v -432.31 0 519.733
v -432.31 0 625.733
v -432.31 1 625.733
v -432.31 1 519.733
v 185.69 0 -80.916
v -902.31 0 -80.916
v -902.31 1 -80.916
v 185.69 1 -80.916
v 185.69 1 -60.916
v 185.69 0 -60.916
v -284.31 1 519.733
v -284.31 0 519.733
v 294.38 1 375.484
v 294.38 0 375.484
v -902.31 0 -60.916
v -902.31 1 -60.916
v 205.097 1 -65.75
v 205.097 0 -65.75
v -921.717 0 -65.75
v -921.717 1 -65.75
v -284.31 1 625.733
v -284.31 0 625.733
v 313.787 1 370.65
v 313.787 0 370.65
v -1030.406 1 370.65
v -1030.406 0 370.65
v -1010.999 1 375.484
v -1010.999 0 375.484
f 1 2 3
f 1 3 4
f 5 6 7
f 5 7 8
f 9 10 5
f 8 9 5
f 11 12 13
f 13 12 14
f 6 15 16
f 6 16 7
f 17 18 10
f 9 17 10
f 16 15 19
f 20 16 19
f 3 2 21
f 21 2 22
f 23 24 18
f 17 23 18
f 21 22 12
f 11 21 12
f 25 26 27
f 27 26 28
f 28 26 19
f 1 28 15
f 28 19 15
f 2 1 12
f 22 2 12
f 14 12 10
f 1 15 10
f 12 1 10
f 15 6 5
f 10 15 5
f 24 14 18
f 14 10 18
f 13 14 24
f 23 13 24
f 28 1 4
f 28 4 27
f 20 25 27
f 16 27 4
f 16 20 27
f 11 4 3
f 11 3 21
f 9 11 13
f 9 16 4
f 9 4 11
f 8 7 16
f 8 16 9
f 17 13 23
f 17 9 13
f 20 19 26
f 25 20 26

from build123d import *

# Parameters (mm, degrees)
SKETCH1_W           = 148
SKETCH1_H           = 106
SKETCH1_W_2         = 1088
SKETCH1_H_2         = 20
BOSS_EXTRUDE1_DEPTH = 1


with BuildPart() as part:
    # Sketch1 → Boss-Extrude1 (new body)
    with BuildSketch(Plane(origin=(0, 0, 0), x_dir=(1, 0, 0), z_dir=(0, 1, 0))):
        Polygon((-284.309741609, -519.73309486), (294.379685644, -375.483559699), (185.690258391, 60.9163871), align=None)
        with Locations((-358.309741609, -572.73309486)):
            Rectangle(SKETCH1_W, SKETCH1_H)
        Polygon((294.379685644, -375.483559699), (313.786824034, -370.650033087), (205.097396781, 65.749913711), (185.690258391, 60.9163871), align=None)
        with Locations((-358.309741609, 70.9163871)):
            Rectangle(SKETCH1_W_2, SKETCH1_H_2)
        Polygon((-902.309741609, 60.9163871), (-921.71688, 65.749913711), (-1030.406307253, -370.650033087), (-1010.999168863, -375.483559699), align=None)
        Polygon((-1010.999168863, -375.483559699), (-902.309741609, 60.9163871), (-432.309741609, -519.73309486), align=None)
        Polygon((185.690258391, 60.9163871), (-284.309741609, -519.73309486), (-432.309741609, -519.73309486), (-902.309741609, 60.9163871), align=None)
    extrude(amount=BOSS_EXTRUDE1_DEPTH)


solid = part.part
